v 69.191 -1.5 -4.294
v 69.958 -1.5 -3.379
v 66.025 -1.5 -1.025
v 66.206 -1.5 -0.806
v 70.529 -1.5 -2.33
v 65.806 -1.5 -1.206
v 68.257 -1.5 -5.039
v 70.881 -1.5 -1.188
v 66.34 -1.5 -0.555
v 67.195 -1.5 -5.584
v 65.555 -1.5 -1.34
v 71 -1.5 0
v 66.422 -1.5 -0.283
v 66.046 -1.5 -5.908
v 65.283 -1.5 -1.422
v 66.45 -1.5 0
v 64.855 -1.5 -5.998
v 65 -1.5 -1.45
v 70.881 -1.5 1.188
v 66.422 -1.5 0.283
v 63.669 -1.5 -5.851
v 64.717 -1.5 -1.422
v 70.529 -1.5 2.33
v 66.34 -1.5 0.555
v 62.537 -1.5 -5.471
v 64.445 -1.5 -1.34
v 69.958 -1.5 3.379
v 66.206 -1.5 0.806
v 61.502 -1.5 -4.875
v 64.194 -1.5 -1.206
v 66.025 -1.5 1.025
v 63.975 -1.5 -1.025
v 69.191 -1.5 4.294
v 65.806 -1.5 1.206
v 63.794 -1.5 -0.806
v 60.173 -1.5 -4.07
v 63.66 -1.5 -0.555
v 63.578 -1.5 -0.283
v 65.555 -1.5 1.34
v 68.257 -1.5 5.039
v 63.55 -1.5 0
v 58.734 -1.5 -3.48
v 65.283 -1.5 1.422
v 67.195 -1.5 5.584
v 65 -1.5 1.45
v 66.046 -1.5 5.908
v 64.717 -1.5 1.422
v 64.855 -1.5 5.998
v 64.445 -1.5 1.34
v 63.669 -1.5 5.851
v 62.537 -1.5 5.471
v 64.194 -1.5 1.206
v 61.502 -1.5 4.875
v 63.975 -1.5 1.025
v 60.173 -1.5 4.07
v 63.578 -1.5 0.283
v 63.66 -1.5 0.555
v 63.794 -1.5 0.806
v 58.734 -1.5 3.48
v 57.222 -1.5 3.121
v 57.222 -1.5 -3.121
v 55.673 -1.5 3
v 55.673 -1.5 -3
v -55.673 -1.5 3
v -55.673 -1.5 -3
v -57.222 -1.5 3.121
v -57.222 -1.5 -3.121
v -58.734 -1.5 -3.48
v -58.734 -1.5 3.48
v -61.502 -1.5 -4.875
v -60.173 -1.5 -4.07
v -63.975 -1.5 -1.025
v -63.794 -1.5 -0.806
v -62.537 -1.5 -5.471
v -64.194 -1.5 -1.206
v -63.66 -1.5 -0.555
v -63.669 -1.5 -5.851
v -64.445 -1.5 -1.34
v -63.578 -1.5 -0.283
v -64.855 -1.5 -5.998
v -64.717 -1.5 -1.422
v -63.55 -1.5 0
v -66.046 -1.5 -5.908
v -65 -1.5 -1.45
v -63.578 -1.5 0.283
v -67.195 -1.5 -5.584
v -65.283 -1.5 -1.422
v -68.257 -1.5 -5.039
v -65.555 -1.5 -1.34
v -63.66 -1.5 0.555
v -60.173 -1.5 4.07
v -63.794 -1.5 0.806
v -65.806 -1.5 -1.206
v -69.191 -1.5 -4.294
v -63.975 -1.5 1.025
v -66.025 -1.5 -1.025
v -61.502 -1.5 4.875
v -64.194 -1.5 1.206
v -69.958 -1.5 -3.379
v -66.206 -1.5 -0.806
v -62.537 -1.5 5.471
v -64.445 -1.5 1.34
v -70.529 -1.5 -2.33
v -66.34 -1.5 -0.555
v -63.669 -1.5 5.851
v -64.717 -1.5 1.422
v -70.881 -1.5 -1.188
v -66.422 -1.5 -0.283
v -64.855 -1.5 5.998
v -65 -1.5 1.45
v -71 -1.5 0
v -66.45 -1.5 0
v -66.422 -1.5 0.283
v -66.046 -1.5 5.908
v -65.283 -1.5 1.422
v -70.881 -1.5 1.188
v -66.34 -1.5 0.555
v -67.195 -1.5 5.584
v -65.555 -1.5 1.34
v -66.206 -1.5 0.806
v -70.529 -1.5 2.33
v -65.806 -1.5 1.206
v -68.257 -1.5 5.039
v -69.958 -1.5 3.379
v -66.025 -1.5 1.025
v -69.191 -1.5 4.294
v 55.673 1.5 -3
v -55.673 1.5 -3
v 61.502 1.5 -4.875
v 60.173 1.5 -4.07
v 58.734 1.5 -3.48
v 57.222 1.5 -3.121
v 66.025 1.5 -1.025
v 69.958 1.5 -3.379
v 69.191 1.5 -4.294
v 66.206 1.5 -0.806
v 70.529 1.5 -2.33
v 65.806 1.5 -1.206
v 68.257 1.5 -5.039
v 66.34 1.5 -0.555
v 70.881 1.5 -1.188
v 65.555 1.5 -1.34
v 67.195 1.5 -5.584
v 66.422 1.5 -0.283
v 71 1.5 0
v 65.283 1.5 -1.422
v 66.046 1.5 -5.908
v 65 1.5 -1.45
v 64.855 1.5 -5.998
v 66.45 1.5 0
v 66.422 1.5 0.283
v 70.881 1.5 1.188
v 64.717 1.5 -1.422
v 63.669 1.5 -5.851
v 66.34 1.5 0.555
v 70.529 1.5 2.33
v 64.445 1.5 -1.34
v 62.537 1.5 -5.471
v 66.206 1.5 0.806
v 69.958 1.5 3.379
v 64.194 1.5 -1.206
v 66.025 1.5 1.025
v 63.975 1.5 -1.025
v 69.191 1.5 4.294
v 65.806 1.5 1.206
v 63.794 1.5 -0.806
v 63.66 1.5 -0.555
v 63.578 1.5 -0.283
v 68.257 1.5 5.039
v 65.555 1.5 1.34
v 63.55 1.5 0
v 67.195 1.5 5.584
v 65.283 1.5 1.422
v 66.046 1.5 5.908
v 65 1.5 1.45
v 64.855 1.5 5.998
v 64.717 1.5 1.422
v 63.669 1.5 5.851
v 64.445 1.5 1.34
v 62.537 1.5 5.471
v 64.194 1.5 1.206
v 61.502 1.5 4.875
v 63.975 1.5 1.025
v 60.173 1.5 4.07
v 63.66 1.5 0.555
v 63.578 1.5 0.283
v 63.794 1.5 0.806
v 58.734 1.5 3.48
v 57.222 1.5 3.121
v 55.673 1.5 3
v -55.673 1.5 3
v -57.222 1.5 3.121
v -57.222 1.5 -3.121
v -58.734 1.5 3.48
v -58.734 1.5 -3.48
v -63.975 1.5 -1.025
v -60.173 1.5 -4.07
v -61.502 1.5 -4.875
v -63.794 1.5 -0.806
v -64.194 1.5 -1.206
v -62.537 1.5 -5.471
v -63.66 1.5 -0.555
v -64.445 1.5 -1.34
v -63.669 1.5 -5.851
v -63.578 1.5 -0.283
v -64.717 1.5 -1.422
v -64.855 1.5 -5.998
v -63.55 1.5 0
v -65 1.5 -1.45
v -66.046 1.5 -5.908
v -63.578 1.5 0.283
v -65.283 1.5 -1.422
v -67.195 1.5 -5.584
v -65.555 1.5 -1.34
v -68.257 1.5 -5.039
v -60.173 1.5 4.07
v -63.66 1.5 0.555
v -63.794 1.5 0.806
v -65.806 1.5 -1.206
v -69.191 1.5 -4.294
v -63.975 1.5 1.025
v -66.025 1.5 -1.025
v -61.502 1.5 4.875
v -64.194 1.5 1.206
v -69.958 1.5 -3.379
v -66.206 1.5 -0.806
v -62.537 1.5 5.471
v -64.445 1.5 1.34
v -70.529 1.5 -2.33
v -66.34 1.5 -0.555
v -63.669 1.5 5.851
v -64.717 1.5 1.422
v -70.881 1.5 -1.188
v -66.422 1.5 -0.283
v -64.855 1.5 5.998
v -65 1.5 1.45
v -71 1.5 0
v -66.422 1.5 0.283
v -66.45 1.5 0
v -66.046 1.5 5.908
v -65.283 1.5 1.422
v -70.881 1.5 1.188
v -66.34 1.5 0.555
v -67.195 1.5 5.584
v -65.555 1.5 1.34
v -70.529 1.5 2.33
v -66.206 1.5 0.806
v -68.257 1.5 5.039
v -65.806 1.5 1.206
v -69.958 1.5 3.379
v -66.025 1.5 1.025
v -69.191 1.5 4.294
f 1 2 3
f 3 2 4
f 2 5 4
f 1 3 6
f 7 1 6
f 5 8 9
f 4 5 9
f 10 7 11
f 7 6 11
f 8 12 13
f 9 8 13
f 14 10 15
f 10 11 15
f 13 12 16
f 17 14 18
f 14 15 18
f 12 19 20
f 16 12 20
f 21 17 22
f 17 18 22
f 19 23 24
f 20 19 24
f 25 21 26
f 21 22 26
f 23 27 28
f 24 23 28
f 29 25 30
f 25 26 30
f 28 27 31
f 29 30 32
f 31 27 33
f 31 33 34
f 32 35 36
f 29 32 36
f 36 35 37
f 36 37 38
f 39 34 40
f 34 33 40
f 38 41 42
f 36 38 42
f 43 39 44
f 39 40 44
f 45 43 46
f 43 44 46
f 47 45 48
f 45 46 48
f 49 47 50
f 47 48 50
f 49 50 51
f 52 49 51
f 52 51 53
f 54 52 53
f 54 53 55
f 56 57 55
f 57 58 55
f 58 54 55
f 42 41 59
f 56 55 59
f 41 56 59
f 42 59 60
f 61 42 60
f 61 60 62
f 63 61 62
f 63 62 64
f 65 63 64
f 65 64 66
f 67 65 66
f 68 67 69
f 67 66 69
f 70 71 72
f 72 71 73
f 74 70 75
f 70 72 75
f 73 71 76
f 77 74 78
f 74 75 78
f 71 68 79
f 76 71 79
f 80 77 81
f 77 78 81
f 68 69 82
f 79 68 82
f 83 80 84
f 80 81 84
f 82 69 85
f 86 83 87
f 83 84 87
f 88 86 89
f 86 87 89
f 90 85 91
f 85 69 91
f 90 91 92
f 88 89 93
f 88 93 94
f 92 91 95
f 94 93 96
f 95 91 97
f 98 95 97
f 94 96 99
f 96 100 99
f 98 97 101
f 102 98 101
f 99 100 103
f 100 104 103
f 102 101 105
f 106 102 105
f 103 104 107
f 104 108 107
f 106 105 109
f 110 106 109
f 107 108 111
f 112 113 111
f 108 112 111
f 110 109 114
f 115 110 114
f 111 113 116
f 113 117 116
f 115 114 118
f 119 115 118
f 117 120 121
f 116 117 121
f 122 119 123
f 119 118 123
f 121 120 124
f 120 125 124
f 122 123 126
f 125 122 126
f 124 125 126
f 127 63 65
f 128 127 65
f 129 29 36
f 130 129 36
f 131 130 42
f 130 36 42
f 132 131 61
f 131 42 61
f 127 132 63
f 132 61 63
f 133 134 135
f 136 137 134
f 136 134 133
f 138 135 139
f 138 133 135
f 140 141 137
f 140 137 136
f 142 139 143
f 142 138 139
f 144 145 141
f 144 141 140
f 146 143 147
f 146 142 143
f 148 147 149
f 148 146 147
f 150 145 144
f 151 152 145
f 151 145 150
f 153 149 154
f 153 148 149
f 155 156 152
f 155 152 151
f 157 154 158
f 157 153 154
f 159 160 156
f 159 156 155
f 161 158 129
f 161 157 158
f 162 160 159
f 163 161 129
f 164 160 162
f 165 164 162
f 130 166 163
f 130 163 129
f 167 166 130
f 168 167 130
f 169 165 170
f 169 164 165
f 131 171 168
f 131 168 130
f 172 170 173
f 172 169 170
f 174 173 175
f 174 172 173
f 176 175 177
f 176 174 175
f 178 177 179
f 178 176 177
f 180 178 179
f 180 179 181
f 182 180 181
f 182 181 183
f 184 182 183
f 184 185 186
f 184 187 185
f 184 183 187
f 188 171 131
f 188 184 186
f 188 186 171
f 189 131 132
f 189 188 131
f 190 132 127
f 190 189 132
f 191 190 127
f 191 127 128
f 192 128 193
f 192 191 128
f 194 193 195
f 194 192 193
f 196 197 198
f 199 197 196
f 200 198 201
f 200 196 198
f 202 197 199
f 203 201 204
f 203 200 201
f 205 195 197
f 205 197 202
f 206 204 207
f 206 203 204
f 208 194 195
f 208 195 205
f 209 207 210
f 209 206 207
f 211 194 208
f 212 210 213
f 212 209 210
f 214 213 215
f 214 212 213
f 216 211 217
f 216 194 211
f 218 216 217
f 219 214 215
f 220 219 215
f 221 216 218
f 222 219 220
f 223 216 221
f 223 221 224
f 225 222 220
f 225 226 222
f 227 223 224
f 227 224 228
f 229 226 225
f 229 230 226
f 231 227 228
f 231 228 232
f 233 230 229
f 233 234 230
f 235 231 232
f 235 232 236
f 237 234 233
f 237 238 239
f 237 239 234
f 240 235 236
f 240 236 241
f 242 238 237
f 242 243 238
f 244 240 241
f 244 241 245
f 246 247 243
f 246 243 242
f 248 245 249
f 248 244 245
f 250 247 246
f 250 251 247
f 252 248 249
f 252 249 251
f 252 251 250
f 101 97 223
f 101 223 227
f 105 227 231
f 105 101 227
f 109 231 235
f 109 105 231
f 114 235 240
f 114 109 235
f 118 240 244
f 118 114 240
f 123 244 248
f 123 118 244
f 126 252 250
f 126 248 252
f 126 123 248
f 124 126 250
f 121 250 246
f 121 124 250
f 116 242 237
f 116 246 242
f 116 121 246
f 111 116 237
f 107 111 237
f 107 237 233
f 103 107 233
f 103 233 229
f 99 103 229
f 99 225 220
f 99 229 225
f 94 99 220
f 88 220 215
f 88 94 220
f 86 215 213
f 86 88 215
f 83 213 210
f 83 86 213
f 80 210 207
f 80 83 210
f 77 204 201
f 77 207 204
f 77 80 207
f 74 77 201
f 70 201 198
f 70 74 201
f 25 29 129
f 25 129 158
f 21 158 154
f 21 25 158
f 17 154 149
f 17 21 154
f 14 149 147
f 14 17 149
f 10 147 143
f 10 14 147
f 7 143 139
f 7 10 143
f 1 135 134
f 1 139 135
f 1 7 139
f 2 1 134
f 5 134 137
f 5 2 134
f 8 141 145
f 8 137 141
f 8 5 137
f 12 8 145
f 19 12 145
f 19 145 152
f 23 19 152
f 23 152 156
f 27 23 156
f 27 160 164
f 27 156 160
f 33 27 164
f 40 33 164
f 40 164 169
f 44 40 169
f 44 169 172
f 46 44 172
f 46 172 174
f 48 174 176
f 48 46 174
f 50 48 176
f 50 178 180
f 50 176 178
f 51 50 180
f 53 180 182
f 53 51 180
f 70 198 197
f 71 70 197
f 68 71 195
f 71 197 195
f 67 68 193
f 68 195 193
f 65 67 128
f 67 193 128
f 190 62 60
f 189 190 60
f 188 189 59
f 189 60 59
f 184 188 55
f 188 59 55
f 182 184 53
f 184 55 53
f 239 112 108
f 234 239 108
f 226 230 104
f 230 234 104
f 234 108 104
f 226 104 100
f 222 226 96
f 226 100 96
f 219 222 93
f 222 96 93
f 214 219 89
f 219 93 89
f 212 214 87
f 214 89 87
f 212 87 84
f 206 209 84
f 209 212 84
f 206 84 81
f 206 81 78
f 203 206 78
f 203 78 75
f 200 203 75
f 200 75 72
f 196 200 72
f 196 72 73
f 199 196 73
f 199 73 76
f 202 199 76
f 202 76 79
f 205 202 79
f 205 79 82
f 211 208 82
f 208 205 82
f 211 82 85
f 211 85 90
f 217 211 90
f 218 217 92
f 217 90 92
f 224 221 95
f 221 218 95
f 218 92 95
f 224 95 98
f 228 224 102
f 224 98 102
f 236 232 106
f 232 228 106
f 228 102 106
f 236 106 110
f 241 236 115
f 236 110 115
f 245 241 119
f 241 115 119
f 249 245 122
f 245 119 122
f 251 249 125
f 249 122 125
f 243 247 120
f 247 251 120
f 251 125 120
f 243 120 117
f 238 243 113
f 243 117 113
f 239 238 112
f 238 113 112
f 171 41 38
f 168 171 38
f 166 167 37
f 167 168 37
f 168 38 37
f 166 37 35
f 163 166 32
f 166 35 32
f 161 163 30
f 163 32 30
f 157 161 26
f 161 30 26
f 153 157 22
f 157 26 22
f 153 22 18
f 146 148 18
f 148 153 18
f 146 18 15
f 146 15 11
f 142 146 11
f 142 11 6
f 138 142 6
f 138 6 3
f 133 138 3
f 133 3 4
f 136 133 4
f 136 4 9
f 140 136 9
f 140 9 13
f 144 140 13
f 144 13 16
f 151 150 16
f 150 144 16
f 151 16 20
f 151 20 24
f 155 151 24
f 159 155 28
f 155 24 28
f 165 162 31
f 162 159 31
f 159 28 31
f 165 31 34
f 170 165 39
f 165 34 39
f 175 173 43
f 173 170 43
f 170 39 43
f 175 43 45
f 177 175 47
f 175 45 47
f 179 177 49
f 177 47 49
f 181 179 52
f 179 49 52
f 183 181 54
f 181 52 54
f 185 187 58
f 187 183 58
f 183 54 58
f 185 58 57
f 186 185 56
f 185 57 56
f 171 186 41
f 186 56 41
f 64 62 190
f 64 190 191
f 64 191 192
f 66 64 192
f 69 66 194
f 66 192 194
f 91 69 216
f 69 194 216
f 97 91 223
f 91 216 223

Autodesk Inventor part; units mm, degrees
ref_plane "YZ Plane" through (0, 0, 0) normal (1, 0, 0) x (0, 1, 0)
ref_plane "XZ Plane" through (0, 0, 0) normal (0, 1, 0) x (-1, 0, 0)
ref_plane "XY Plane" through (0, 0, 0) normal (0, 0, 1) x (1, 0, 0)
sketch "Эскиз1" plane through (0, 0, 0) normal (0, 1, 0) x (-1, 0, 0)
  arc A0 (59.8038, -3) -> (59.8038, 3) centre (65, 0) ccw
  line L0 (29.2568, 0) -> (27.2769, 0)
  circle A1 centre (65, 0) radius 1.45
  line L1 (0, -3) -> (59.8038, -3)
  line L2 (0, 3) -> (59.8038, 3)
  line L3 (0, -9.1238) -> (0, 12.1062) construction
  arc A2 (-59.8038, 3) -> (-59.8038, -3) centre (-65, 0) ccw
  circle A3 centre (-65, 0) radius 1.45
  line L4 (0, -3) -> (-59.8038, -3)
  line L5 (0, 3) -> (-59.8038, 3)
  point P0 (0, 0)
  dimension "d2" = 2.9
  dimension "d5" = 6
  dimension "d7" = 6
  dimension "d8" = 65
extrude "Выдавливание1" add sketch "Эскиз1" along normal mid plane 3
fillet "Сопряжение1" radius 10 4 edges at (-59.8038, 0, -3) (-59.8038, 0, 3) (59.8038, 0, 3) (59.8038, 0, -3)
properties part number "Рычаг головы" material "Золото"
